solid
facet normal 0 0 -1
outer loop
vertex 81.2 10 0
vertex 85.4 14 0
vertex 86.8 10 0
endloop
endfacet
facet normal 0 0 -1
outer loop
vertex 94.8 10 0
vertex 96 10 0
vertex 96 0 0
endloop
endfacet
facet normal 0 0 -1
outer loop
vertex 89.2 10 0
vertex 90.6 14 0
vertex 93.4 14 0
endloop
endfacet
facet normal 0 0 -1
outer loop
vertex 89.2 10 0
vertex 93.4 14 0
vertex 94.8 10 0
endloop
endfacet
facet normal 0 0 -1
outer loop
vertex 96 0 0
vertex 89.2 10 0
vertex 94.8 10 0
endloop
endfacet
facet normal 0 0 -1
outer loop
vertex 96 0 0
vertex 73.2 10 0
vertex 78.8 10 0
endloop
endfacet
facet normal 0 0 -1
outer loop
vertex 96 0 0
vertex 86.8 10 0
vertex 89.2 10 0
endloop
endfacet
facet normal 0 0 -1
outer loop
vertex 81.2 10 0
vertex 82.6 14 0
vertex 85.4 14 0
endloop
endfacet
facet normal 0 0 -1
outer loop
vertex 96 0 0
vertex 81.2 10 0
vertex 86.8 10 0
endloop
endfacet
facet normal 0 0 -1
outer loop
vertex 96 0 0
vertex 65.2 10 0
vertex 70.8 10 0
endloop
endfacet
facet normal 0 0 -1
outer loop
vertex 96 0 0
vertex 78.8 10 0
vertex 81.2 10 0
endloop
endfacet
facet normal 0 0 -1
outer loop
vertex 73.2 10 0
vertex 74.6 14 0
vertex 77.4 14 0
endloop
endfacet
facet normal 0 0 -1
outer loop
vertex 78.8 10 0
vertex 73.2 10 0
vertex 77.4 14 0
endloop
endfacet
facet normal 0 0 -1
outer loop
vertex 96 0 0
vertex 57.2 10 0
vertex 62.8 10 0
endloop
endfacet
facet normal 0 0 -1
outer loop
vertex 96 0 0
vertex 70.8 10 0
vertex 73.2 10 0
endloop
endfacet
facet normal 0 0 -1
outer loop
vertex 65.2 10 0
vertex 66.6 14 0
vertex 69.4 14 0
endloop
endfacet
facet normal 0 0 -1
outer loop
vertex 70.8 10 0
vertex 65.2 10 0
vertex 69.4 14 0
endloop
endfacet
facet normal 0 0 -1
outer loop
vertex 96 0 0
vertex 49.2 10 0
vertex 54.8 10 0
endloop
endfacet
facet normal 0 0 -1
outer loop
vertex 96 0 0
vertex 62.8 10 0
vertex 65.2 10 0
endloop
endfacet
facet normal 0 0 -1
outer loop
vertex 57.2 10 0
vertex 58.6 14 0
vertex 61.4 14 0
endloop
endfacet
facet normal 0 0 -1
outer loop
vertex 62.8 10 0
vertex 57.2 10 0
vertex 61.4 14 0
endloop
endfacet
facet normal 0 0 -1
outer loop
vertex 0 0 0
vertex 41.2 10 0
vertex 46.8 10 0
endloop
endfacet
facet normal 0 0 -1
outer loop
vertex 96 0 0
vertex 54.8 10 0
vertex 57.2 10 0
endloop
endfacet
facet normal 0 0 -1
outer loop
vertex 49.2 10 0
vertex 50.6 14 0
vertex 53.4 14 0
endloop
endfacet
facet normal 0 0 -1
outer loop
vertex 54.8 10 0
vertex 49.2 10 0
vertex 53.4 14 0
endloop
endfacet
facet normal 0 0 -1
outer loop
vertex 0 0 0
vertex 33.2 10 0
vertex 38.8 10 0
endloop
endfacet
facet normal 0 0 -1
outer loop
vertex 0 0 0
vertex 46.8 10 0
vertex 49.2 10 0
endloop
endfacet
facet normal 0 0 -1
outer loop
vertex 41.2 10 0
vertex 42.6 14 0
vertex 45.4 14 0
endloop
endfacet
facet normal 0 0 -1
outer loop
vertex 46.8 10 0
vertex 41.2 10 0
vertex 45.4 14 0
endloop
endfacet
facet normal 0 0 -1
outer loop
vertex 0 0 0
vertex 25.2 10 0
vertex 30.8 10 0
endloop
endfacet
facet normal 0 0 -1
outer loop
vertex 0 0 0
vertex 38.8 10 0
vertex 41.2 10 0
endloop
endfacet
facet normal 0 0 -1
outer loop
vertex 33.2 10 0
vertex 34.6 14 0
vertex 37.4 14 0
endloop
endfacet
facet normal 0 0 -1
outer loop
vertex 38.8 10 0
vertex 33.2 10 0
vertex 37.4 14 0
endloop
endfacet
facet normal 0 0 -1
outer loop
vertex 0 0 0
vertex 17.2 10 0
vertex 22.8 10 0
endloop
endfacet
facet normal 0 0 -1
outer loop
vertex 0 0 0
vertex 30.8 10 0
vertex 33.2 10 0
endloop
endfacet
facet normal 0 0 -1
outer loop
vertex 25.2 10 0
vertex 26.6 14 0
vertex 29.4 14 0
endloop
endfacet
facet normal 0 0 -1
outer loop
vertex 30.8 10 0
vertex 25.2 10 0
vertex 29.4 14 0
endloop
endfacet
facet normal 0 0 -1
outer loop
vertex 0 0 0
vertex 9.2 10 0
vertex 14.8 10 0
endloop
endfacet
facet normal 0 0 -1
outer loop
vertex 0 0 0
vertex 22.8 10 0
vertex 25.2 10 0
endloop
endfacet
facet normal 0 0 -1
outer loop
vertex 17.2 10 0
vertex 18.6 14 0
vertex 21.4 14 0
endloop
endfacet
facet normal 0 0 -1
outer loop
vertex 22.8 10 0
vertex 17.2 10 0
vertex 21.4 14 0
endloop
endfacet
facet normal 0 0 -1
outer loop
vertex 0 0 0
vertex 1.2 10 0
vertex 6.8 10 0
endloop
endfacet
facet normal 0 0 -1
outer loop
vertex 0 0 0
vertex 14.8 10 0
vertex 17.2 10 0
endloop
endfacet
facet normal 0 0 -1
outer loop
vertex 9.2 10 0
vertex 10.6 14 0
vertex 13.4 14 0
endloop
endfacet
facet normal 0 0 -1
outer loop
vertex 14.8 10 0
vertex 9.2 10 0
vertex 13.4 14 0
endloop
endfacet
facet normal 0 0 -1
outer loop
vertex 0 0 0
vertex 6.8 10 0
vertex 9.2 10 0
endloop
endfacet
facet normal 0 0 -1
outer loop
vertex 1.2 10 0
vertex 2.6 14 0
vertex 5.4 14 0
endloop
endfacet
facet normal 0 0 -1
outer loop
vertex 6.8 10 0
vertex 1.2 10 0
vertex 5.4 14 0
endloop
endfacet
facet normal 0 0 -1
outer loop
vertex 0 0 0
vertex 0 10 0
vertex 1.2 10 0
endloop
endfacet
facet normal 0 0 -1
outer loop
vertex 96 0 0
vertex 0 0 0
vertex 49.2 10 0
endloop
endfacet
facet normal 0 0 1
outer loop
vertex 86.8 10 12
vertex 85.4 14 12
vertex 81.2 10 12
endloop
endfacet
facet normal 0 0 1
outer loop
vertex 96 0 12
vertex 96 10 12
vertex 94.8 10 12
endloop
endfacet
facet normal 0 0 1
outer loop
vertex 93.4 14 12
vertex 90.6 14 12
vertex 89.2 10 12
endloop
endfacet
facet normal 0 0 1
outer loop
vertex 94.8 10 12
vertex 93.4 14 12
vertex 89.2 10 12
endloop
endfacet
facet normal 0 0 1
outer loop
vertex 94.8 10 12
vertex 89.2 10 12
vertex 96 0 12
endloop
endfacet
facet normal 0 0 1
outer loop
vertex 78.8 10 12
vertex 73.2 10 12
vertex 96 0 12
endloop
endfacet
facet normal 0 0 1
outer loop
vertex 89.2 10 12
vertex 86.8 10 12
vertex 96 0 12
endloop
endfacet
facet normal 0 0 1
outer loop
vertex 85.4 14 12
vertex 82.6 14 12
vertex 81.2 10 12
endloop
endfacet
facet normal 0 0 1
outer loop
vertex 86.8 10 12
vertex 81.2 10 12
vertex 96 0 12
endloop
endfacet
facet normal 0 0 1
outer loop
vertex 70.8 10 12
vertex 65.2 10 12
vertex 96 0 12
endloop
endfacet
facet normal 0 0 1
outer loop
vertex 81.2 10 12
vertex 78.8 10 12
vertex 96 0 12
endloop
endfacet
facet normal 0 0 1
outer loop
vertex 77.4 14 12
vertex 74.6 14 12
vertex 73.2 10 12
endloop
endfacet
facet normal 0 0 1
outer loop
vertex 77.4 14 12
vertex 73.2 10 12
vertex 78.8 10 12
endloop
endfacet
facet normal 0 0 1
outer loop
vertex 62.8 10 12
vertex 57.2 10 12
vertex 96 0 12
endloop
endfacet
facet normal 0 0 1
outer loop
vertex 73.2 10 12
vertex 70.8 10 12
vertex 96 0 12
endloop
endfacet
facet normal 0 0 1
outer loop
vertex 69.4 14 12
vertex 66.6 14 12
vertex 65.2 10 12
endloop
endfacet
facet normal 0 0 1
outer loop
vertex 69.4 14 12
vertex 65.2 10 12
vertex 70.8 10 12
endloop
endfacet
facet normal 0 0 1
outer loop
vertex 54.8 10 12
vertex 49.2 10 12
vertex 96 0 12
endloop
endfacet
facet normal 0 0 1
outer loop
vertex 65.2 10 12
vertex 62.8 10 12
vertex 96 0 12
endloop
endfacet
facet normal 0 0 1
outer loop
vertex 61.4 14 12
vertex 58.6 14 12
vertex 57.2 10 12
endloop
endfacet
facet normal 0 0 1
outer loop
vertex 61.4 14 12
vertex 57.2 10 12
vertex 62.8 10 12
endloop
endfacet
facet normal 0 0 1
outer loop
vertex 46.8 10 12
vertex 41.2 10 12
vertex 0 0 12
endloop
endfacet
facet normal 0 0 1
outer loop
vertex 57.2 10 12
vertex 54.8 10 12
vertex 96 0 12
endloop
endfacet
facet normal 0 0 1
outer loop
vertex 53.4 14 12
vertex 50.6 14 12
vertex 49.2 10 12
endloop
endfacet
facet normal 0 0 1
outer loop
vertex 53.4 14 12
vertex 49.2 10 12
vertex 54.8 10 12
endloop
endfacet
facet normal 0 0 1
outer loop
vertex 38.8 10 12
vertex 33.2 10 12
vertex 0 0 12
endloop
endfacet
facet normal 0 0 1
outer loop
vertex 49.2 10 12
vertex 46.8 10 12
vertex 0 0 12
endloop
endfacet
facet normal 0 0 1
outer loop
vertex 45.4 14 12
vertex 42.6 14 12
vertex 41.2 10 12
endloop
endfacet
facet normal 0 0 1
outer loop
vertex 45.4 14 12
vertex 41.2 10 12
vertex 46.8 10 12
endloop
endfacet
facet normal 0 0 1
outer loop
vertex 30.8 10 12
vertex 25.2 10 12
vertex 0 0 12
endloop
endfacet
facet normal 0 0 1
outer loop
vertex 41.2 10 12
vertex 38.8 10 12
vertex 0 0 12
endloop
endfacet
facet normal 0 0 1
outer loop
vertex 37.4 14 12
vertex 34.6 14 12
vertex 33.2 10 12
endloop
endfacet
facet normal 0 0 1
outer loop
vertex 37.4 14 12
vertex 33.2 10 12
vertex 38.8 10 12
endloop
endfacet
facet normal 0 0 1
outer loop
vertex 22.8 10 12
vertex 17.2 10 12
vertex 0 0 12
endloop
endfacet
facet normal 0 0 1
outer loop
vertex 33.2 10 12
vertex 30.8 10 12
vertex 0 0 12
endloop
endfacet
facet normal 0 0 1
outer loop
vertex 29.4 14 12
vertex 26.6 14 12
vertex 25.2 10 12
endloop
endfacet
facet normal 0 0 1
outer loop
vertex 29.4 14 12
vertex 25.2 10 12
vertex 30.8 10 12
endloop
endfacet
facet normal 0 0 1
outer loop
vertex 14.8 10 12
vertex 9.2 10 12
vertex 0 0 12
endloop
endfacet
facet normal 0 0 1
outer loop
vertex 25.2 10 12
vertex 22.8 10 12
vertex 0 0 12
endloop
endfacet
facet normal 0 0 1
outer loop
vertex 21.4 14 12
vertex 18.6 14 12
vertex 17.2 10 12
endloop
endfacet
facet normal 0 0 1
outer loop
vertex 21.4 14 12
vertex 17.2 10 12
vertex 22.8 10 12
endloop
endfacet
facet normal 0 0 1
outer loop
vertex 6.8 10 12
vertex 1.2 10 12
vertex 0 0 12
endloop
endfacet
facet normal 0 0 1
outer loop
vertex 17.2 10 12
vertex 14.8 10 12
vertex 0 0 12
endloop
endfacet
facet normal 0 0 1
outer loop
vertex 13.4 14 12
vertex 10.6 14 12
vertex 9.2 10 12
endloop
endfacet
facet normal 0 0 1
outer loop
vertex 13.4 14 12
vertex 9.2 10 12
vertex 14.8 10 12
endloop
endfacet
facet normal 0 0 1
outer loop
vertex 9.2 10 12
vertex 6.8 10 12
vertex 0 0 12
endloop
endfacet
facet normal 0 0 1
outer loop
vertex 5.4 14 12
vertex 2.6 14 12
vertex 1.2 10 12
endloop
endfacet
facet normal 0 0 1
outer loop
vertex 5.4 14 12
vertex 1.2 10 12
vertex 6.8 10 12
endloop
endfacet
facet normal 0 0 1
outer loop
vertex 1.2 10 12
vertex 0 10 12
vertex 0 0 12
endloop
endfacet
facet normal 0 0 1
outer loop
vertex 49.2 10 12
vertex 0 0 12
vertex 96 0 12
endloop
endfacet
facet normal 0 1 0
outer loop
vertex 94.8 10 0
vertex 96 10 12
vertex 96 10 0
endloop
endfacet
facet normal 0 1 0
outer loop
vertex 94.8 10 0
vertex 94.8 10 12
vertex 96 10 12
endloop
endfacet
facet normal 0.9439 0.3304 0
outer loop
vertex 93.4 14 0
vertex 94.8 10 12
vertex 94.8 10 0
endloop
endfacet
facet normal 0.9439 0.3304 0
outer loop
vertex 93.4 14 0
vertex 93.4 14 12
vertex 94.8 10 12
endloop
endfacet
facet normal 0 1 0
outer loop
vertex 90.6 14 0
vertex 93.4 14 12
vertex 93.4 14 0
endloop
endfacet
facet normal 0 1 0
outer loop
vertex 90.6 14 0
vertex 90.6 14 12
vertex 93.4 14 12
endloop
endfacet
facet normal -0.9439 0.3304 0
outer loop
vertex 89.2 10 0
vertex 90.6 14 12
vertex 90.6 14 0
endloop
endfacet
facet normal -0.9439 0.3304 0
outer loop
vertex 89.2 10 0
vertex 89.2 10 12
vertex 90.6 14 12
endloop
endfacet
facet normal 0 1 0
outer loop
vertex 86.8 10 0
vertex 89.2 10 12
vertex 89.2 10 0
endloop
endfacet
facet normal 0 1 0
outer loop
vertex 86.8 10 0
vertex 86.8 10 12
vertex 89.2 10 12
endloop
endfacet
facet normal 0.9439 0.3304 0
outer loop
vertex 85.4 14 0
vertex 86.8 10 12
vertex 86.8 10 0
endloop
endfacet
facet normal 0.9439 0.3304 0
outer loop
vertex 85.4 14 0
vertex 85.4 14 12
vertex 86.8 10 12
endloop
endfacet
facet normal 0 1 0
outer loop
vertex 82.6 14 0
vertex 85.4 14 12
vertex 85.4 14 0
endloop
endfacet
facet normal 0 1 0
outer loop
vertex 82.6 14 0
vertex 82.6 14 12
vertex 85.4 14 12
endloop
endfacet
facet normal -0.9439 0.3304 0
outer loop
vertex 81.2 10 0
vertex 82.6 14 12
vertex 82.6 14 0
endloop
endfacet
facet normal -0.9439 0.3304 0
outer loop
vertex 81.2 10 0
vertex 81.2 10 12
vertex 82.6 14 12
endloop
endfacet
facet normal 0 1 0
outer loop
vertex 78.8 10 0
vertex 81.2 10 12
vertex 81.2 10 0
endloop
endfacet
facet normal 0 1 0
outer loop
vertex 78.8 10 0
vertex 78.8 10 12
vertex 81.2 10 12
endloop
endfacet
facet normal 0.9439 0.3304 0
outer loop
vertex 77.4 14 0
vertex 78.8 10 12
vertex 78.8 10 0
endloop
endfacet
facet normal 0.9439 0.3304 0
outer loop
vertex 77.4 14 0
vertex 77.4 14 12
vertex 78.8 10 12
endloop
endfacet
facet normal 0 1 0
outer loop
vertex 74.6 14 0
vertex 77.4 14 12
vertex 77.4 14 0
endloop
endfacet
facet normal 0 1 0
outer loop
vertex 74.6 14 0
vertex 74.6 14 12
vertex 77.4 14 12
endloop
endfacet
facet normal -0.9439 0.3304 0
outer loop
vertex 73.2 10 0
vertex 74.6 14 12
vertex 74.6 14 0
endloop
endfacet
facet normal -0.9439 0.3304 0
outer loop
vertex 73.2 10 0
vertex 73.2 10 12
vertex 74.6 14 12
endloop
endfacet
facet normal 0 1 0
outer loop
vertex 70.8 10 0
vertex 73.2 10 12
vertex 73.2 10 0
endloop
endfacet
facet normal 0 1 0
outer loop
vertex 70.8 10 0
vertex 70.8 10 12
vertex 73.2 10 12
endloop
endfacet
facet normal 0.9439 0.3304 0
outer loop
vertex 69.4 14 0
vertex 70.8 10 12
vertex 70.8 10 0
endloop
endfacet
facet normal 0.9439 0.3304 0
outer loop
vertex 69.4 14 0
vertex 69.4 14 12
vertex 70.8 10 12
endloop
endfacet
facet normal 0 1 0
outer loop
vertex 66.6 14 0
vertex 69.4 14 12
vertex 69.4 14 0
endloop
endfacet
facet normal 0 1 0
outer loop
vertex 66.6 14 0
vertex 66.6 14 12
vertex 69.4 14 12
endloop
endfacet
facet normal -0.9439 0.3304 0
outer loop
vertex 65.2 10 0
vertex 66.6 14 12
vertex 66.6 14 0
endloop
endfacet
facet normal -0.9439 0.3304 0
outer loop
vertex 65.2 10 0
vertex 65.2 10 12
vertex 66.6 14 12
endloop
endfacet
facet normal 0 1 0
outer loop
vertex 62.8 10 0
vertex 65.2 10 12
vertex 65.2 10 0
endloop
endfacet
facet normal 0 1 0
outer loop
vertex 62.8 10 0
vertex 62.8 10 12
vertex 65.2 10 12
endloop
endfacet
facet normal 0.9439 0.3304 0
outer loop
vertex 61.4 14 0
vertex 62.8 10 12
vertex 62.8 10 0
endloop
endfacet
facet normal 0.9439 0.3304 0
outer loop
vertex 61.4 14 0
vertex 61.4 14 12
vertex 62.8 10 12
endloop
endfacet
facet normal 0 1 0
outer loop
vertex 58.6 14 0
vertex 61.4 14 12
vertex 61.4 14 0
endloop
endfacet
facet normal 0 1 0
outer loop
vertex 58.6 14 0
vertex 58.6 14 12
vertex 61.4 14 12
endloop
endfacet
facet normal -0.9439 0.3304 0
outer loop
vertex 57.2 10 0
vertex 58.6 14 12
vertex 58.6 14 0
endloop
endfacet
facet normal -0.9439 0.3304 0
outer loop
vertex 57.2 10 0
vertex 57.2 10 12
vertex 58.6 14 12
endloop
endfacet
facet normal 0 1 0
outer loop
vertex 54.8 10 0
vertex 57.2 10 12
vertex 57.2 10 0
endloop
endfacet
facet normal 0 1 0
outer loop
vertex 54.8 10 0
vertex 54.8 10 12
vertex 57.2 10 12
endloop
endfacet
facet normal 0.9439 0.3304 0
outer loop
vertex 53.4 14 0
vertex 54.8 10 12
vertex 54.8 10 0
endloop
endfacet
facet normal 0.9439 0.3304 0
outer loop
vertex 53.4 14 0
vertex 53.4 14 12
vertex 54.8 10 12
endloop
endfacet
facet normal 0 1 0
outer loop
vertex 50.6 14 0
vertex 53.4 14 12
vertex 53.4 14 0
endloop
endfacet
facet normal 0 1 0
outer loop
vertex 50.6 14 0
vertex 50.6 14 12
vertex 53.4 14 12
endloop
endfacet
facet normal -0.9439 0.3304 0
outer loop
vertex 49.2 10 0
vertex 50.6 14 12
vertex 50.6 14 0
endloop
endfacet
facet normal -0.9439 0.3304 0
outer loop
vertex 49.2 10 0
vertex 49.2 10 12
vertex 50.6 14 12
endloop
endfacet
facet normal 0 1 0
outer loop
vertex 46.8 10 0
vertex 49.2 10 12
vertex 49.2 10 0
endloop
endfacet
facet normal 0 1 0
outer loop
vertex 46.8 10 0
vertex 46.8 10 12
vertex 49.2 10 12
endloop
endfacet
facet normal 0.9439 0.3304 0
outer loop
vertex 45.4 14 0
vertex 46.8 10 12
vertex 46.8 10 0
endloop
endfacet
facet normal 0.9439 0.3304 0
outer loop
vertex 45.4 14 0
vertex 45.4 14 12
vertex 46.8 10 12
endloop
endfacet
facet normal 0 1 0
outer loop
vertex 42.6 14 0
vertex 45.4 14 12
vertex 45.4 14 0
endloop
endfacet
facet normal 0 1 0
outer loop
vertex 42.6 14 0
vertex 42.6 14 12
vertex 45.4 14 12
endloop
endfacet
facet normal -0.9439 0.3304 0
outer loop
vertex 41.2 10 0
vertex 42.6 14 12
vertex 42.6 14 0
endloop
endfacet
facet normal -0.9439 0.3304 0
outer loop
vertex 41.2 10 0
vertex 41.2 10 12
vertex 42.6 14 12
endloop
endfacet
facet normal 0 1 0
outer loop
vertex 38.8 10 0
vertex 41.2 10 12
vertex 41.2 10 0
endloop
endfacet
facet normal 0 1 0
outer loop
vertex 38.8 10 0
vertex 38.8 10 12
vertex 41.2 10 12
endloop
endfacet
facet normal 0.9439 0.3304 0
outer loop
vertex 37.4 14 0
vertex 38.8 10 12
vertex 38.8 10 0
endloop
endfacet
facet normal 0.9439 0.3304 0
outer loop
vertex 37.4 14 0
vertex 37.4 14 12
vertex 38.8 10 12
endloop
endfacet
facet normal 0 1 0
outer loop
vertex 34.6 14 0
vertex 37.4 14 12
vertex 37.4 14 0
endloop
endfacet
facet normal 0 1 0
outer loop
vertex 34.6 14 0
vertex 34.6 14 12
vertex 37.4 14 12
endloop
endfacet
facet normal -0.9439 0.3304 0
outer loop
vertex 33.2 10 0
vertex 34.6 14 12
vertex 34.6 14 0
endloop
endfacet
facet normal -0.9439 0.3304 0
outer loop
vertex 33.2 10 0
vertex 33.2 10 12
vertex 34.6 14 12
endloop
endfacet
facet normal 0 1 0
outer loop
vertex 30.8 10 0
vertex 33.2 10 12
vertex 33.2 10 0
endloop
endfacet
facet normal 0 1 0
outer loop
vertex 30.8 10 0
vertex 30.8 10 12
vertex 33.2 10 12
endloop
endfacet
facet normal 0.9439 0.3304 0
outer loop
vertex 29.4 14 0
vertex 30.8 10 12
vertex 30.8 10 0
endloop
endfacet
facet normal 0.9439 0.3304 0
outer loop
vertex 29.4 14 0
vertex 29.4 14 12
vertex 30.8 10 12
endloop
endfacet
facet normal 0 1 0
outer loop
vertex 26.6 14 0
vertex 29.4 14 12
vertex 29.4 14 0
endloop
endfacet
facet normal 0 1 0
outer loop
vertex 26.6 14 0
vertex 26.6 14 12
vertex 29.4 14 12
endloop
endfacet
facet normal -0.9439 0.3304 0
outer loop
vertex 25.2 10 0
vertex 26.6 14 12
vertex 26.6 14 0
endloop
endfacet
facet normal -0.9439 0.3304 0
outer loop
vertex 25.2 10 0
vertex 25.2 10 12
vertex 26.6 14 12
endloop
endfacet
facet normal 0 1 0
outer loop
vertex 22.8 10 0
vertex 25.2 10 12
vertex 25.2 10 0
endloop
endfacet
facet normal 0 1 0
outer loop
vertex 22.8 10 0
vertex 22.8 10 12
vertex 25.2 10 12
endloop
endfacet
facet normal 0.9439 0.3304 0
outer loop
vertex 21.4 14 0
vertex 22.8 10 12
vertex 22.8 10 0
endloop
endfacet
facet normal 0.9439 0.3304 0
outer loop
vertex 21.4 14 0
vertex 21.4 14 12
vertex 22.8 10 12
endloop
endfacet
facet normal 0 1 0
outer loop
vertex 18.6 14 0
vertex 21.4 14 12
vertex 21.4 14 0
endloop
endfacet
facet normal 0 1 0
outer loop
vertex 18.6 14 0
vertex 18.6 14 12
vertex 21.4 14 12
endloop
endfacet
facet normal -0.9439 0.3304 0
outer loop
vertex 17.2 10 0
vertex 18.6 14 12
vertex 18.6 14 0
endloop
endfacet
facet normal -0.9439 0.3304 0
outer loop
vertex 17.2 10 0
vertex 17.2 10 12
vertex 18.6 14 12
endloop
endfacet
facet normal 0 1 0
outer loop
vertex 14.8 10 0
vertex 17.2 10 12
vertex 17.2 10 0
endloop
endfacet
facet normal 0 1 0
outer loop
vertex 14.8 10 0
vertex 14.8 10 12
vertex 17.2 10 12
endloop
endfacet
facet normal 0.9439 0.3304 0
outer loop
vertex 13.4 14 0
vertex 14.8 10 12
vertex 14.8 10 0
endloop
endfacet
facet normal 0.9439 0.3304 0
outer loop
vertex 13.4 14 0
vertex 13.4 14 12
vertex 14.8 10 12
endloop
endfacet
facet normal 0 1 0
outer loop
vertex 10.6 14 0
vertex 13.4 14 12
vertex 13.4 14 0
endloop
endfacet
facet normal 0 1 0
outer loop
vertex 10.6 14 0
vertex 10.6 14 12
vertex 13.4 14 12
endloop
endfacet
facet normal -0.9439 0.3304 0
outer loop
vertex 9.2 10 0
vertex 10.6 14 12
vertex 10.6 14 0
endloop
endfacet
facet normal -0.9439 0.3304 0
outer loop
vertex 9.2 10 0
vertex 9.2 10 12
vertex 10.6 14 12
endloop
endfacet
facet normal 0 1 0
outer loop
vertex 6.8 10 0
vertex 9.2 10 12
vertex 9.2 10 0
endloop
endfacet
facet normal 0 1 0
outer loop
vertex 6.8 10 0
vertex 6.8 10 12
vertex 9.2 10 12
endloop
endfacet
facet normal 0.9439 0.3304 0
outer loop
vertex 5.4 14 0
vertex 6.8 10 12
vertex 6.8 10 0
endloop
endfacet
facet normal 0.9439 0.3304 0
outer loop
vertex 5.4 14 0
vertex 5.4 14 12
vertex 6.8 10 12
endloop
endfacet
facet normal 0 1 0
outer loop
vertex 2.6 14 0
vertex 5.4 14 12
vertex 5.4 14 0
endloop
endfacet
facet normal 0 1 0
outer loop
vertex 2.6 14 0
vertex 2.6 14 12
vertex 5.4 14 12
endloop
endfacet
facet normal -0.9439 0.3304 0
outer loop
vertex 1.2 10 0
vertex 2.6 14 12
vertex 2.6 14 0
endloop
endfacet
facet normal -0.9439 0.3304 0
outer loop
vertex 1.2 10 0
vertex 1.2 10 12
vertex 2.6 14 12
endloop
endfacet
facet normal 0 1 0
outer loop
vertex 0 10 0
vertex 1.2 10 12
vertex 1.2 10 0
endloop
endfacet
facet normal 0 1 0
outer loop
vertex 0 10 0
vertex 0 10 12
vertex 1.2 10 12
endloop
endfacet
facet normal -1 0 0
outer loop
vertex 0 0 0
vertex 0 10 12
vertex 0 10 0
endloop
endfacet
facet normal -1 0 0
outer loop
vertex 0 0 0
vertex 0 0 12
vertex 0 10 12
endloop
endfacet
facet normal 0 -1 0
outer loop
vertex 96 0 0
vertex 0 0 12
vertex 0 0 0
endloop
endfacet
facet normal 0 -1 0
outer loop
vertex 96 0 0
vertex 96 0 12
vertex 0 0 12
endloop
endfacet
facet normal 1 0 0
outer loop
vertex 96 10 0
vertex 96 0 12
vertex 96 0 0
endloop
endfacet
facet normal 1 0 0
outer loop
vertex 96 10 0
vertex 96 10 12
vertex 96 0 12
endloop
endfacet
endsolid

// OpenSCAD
$fn = 32;

// ----------------------------------------------------------------------
// Gear rack: 12 teeth, pitch 8 mm
// ----------------------------------------------------------------------

// --- parameters (mm) ---
teeth = 12;               // number of teeth
pitch = 8;                // tooth pitch, X
root_w = 5.6;             // tooth width at the root
tip_w = 2.8;              // tooth width at the tip
base_h = 10;              // rack body height, Y
tooth_h = 4;              // tooth height above the body
plate_t = 12;             // rack width, Z (extrusion height)

rack_l = teeth * pitch;  // overall length
total_h = base_h + tooth_h;  // overall height

profile = [[0, 0], [96, 0], [96, 10], [94.8, 10], [93.4, 14], [90.6, 14], [89.2, 10], [86.8, 10], [85.4, 14], [82.6, 14], [81.2, 10], [78.8, 10], [77.4, 14], [74.6, 14], [73.2, 10], [70.8, 10], [69.4, 14], [66.6, 14], [65.2, 10], [62.8, 10], [61.4, 14], [58.6, 14], [57.2, 10], [54.8, 10], [53.4, 14], [50.6, 14], [49.2, 10], [46.8, 10], [45.4, 14], [42.6, 14], [41.2, 10], [38.8, 10], [37.4, 14], [34.6, 14], [33.2, 10], [30.8, 10], [29.4, 14], [26.6, 14], [25.2, 10], [22.8, 10], [21.4, 14], [18.6, 14], [17.2, 10], [14.8, 10], [13.4, 14], [10.6, 14], [9.2, 10], [6.8, 10], [5.4, 14], [2.6, 14], [1.2, 10], [0, 10]];  // primary outline, 52 points, counter clockwise

// --- the one profile operation ---
linear_extrude(height = plate_t) polygon(points = profile);
